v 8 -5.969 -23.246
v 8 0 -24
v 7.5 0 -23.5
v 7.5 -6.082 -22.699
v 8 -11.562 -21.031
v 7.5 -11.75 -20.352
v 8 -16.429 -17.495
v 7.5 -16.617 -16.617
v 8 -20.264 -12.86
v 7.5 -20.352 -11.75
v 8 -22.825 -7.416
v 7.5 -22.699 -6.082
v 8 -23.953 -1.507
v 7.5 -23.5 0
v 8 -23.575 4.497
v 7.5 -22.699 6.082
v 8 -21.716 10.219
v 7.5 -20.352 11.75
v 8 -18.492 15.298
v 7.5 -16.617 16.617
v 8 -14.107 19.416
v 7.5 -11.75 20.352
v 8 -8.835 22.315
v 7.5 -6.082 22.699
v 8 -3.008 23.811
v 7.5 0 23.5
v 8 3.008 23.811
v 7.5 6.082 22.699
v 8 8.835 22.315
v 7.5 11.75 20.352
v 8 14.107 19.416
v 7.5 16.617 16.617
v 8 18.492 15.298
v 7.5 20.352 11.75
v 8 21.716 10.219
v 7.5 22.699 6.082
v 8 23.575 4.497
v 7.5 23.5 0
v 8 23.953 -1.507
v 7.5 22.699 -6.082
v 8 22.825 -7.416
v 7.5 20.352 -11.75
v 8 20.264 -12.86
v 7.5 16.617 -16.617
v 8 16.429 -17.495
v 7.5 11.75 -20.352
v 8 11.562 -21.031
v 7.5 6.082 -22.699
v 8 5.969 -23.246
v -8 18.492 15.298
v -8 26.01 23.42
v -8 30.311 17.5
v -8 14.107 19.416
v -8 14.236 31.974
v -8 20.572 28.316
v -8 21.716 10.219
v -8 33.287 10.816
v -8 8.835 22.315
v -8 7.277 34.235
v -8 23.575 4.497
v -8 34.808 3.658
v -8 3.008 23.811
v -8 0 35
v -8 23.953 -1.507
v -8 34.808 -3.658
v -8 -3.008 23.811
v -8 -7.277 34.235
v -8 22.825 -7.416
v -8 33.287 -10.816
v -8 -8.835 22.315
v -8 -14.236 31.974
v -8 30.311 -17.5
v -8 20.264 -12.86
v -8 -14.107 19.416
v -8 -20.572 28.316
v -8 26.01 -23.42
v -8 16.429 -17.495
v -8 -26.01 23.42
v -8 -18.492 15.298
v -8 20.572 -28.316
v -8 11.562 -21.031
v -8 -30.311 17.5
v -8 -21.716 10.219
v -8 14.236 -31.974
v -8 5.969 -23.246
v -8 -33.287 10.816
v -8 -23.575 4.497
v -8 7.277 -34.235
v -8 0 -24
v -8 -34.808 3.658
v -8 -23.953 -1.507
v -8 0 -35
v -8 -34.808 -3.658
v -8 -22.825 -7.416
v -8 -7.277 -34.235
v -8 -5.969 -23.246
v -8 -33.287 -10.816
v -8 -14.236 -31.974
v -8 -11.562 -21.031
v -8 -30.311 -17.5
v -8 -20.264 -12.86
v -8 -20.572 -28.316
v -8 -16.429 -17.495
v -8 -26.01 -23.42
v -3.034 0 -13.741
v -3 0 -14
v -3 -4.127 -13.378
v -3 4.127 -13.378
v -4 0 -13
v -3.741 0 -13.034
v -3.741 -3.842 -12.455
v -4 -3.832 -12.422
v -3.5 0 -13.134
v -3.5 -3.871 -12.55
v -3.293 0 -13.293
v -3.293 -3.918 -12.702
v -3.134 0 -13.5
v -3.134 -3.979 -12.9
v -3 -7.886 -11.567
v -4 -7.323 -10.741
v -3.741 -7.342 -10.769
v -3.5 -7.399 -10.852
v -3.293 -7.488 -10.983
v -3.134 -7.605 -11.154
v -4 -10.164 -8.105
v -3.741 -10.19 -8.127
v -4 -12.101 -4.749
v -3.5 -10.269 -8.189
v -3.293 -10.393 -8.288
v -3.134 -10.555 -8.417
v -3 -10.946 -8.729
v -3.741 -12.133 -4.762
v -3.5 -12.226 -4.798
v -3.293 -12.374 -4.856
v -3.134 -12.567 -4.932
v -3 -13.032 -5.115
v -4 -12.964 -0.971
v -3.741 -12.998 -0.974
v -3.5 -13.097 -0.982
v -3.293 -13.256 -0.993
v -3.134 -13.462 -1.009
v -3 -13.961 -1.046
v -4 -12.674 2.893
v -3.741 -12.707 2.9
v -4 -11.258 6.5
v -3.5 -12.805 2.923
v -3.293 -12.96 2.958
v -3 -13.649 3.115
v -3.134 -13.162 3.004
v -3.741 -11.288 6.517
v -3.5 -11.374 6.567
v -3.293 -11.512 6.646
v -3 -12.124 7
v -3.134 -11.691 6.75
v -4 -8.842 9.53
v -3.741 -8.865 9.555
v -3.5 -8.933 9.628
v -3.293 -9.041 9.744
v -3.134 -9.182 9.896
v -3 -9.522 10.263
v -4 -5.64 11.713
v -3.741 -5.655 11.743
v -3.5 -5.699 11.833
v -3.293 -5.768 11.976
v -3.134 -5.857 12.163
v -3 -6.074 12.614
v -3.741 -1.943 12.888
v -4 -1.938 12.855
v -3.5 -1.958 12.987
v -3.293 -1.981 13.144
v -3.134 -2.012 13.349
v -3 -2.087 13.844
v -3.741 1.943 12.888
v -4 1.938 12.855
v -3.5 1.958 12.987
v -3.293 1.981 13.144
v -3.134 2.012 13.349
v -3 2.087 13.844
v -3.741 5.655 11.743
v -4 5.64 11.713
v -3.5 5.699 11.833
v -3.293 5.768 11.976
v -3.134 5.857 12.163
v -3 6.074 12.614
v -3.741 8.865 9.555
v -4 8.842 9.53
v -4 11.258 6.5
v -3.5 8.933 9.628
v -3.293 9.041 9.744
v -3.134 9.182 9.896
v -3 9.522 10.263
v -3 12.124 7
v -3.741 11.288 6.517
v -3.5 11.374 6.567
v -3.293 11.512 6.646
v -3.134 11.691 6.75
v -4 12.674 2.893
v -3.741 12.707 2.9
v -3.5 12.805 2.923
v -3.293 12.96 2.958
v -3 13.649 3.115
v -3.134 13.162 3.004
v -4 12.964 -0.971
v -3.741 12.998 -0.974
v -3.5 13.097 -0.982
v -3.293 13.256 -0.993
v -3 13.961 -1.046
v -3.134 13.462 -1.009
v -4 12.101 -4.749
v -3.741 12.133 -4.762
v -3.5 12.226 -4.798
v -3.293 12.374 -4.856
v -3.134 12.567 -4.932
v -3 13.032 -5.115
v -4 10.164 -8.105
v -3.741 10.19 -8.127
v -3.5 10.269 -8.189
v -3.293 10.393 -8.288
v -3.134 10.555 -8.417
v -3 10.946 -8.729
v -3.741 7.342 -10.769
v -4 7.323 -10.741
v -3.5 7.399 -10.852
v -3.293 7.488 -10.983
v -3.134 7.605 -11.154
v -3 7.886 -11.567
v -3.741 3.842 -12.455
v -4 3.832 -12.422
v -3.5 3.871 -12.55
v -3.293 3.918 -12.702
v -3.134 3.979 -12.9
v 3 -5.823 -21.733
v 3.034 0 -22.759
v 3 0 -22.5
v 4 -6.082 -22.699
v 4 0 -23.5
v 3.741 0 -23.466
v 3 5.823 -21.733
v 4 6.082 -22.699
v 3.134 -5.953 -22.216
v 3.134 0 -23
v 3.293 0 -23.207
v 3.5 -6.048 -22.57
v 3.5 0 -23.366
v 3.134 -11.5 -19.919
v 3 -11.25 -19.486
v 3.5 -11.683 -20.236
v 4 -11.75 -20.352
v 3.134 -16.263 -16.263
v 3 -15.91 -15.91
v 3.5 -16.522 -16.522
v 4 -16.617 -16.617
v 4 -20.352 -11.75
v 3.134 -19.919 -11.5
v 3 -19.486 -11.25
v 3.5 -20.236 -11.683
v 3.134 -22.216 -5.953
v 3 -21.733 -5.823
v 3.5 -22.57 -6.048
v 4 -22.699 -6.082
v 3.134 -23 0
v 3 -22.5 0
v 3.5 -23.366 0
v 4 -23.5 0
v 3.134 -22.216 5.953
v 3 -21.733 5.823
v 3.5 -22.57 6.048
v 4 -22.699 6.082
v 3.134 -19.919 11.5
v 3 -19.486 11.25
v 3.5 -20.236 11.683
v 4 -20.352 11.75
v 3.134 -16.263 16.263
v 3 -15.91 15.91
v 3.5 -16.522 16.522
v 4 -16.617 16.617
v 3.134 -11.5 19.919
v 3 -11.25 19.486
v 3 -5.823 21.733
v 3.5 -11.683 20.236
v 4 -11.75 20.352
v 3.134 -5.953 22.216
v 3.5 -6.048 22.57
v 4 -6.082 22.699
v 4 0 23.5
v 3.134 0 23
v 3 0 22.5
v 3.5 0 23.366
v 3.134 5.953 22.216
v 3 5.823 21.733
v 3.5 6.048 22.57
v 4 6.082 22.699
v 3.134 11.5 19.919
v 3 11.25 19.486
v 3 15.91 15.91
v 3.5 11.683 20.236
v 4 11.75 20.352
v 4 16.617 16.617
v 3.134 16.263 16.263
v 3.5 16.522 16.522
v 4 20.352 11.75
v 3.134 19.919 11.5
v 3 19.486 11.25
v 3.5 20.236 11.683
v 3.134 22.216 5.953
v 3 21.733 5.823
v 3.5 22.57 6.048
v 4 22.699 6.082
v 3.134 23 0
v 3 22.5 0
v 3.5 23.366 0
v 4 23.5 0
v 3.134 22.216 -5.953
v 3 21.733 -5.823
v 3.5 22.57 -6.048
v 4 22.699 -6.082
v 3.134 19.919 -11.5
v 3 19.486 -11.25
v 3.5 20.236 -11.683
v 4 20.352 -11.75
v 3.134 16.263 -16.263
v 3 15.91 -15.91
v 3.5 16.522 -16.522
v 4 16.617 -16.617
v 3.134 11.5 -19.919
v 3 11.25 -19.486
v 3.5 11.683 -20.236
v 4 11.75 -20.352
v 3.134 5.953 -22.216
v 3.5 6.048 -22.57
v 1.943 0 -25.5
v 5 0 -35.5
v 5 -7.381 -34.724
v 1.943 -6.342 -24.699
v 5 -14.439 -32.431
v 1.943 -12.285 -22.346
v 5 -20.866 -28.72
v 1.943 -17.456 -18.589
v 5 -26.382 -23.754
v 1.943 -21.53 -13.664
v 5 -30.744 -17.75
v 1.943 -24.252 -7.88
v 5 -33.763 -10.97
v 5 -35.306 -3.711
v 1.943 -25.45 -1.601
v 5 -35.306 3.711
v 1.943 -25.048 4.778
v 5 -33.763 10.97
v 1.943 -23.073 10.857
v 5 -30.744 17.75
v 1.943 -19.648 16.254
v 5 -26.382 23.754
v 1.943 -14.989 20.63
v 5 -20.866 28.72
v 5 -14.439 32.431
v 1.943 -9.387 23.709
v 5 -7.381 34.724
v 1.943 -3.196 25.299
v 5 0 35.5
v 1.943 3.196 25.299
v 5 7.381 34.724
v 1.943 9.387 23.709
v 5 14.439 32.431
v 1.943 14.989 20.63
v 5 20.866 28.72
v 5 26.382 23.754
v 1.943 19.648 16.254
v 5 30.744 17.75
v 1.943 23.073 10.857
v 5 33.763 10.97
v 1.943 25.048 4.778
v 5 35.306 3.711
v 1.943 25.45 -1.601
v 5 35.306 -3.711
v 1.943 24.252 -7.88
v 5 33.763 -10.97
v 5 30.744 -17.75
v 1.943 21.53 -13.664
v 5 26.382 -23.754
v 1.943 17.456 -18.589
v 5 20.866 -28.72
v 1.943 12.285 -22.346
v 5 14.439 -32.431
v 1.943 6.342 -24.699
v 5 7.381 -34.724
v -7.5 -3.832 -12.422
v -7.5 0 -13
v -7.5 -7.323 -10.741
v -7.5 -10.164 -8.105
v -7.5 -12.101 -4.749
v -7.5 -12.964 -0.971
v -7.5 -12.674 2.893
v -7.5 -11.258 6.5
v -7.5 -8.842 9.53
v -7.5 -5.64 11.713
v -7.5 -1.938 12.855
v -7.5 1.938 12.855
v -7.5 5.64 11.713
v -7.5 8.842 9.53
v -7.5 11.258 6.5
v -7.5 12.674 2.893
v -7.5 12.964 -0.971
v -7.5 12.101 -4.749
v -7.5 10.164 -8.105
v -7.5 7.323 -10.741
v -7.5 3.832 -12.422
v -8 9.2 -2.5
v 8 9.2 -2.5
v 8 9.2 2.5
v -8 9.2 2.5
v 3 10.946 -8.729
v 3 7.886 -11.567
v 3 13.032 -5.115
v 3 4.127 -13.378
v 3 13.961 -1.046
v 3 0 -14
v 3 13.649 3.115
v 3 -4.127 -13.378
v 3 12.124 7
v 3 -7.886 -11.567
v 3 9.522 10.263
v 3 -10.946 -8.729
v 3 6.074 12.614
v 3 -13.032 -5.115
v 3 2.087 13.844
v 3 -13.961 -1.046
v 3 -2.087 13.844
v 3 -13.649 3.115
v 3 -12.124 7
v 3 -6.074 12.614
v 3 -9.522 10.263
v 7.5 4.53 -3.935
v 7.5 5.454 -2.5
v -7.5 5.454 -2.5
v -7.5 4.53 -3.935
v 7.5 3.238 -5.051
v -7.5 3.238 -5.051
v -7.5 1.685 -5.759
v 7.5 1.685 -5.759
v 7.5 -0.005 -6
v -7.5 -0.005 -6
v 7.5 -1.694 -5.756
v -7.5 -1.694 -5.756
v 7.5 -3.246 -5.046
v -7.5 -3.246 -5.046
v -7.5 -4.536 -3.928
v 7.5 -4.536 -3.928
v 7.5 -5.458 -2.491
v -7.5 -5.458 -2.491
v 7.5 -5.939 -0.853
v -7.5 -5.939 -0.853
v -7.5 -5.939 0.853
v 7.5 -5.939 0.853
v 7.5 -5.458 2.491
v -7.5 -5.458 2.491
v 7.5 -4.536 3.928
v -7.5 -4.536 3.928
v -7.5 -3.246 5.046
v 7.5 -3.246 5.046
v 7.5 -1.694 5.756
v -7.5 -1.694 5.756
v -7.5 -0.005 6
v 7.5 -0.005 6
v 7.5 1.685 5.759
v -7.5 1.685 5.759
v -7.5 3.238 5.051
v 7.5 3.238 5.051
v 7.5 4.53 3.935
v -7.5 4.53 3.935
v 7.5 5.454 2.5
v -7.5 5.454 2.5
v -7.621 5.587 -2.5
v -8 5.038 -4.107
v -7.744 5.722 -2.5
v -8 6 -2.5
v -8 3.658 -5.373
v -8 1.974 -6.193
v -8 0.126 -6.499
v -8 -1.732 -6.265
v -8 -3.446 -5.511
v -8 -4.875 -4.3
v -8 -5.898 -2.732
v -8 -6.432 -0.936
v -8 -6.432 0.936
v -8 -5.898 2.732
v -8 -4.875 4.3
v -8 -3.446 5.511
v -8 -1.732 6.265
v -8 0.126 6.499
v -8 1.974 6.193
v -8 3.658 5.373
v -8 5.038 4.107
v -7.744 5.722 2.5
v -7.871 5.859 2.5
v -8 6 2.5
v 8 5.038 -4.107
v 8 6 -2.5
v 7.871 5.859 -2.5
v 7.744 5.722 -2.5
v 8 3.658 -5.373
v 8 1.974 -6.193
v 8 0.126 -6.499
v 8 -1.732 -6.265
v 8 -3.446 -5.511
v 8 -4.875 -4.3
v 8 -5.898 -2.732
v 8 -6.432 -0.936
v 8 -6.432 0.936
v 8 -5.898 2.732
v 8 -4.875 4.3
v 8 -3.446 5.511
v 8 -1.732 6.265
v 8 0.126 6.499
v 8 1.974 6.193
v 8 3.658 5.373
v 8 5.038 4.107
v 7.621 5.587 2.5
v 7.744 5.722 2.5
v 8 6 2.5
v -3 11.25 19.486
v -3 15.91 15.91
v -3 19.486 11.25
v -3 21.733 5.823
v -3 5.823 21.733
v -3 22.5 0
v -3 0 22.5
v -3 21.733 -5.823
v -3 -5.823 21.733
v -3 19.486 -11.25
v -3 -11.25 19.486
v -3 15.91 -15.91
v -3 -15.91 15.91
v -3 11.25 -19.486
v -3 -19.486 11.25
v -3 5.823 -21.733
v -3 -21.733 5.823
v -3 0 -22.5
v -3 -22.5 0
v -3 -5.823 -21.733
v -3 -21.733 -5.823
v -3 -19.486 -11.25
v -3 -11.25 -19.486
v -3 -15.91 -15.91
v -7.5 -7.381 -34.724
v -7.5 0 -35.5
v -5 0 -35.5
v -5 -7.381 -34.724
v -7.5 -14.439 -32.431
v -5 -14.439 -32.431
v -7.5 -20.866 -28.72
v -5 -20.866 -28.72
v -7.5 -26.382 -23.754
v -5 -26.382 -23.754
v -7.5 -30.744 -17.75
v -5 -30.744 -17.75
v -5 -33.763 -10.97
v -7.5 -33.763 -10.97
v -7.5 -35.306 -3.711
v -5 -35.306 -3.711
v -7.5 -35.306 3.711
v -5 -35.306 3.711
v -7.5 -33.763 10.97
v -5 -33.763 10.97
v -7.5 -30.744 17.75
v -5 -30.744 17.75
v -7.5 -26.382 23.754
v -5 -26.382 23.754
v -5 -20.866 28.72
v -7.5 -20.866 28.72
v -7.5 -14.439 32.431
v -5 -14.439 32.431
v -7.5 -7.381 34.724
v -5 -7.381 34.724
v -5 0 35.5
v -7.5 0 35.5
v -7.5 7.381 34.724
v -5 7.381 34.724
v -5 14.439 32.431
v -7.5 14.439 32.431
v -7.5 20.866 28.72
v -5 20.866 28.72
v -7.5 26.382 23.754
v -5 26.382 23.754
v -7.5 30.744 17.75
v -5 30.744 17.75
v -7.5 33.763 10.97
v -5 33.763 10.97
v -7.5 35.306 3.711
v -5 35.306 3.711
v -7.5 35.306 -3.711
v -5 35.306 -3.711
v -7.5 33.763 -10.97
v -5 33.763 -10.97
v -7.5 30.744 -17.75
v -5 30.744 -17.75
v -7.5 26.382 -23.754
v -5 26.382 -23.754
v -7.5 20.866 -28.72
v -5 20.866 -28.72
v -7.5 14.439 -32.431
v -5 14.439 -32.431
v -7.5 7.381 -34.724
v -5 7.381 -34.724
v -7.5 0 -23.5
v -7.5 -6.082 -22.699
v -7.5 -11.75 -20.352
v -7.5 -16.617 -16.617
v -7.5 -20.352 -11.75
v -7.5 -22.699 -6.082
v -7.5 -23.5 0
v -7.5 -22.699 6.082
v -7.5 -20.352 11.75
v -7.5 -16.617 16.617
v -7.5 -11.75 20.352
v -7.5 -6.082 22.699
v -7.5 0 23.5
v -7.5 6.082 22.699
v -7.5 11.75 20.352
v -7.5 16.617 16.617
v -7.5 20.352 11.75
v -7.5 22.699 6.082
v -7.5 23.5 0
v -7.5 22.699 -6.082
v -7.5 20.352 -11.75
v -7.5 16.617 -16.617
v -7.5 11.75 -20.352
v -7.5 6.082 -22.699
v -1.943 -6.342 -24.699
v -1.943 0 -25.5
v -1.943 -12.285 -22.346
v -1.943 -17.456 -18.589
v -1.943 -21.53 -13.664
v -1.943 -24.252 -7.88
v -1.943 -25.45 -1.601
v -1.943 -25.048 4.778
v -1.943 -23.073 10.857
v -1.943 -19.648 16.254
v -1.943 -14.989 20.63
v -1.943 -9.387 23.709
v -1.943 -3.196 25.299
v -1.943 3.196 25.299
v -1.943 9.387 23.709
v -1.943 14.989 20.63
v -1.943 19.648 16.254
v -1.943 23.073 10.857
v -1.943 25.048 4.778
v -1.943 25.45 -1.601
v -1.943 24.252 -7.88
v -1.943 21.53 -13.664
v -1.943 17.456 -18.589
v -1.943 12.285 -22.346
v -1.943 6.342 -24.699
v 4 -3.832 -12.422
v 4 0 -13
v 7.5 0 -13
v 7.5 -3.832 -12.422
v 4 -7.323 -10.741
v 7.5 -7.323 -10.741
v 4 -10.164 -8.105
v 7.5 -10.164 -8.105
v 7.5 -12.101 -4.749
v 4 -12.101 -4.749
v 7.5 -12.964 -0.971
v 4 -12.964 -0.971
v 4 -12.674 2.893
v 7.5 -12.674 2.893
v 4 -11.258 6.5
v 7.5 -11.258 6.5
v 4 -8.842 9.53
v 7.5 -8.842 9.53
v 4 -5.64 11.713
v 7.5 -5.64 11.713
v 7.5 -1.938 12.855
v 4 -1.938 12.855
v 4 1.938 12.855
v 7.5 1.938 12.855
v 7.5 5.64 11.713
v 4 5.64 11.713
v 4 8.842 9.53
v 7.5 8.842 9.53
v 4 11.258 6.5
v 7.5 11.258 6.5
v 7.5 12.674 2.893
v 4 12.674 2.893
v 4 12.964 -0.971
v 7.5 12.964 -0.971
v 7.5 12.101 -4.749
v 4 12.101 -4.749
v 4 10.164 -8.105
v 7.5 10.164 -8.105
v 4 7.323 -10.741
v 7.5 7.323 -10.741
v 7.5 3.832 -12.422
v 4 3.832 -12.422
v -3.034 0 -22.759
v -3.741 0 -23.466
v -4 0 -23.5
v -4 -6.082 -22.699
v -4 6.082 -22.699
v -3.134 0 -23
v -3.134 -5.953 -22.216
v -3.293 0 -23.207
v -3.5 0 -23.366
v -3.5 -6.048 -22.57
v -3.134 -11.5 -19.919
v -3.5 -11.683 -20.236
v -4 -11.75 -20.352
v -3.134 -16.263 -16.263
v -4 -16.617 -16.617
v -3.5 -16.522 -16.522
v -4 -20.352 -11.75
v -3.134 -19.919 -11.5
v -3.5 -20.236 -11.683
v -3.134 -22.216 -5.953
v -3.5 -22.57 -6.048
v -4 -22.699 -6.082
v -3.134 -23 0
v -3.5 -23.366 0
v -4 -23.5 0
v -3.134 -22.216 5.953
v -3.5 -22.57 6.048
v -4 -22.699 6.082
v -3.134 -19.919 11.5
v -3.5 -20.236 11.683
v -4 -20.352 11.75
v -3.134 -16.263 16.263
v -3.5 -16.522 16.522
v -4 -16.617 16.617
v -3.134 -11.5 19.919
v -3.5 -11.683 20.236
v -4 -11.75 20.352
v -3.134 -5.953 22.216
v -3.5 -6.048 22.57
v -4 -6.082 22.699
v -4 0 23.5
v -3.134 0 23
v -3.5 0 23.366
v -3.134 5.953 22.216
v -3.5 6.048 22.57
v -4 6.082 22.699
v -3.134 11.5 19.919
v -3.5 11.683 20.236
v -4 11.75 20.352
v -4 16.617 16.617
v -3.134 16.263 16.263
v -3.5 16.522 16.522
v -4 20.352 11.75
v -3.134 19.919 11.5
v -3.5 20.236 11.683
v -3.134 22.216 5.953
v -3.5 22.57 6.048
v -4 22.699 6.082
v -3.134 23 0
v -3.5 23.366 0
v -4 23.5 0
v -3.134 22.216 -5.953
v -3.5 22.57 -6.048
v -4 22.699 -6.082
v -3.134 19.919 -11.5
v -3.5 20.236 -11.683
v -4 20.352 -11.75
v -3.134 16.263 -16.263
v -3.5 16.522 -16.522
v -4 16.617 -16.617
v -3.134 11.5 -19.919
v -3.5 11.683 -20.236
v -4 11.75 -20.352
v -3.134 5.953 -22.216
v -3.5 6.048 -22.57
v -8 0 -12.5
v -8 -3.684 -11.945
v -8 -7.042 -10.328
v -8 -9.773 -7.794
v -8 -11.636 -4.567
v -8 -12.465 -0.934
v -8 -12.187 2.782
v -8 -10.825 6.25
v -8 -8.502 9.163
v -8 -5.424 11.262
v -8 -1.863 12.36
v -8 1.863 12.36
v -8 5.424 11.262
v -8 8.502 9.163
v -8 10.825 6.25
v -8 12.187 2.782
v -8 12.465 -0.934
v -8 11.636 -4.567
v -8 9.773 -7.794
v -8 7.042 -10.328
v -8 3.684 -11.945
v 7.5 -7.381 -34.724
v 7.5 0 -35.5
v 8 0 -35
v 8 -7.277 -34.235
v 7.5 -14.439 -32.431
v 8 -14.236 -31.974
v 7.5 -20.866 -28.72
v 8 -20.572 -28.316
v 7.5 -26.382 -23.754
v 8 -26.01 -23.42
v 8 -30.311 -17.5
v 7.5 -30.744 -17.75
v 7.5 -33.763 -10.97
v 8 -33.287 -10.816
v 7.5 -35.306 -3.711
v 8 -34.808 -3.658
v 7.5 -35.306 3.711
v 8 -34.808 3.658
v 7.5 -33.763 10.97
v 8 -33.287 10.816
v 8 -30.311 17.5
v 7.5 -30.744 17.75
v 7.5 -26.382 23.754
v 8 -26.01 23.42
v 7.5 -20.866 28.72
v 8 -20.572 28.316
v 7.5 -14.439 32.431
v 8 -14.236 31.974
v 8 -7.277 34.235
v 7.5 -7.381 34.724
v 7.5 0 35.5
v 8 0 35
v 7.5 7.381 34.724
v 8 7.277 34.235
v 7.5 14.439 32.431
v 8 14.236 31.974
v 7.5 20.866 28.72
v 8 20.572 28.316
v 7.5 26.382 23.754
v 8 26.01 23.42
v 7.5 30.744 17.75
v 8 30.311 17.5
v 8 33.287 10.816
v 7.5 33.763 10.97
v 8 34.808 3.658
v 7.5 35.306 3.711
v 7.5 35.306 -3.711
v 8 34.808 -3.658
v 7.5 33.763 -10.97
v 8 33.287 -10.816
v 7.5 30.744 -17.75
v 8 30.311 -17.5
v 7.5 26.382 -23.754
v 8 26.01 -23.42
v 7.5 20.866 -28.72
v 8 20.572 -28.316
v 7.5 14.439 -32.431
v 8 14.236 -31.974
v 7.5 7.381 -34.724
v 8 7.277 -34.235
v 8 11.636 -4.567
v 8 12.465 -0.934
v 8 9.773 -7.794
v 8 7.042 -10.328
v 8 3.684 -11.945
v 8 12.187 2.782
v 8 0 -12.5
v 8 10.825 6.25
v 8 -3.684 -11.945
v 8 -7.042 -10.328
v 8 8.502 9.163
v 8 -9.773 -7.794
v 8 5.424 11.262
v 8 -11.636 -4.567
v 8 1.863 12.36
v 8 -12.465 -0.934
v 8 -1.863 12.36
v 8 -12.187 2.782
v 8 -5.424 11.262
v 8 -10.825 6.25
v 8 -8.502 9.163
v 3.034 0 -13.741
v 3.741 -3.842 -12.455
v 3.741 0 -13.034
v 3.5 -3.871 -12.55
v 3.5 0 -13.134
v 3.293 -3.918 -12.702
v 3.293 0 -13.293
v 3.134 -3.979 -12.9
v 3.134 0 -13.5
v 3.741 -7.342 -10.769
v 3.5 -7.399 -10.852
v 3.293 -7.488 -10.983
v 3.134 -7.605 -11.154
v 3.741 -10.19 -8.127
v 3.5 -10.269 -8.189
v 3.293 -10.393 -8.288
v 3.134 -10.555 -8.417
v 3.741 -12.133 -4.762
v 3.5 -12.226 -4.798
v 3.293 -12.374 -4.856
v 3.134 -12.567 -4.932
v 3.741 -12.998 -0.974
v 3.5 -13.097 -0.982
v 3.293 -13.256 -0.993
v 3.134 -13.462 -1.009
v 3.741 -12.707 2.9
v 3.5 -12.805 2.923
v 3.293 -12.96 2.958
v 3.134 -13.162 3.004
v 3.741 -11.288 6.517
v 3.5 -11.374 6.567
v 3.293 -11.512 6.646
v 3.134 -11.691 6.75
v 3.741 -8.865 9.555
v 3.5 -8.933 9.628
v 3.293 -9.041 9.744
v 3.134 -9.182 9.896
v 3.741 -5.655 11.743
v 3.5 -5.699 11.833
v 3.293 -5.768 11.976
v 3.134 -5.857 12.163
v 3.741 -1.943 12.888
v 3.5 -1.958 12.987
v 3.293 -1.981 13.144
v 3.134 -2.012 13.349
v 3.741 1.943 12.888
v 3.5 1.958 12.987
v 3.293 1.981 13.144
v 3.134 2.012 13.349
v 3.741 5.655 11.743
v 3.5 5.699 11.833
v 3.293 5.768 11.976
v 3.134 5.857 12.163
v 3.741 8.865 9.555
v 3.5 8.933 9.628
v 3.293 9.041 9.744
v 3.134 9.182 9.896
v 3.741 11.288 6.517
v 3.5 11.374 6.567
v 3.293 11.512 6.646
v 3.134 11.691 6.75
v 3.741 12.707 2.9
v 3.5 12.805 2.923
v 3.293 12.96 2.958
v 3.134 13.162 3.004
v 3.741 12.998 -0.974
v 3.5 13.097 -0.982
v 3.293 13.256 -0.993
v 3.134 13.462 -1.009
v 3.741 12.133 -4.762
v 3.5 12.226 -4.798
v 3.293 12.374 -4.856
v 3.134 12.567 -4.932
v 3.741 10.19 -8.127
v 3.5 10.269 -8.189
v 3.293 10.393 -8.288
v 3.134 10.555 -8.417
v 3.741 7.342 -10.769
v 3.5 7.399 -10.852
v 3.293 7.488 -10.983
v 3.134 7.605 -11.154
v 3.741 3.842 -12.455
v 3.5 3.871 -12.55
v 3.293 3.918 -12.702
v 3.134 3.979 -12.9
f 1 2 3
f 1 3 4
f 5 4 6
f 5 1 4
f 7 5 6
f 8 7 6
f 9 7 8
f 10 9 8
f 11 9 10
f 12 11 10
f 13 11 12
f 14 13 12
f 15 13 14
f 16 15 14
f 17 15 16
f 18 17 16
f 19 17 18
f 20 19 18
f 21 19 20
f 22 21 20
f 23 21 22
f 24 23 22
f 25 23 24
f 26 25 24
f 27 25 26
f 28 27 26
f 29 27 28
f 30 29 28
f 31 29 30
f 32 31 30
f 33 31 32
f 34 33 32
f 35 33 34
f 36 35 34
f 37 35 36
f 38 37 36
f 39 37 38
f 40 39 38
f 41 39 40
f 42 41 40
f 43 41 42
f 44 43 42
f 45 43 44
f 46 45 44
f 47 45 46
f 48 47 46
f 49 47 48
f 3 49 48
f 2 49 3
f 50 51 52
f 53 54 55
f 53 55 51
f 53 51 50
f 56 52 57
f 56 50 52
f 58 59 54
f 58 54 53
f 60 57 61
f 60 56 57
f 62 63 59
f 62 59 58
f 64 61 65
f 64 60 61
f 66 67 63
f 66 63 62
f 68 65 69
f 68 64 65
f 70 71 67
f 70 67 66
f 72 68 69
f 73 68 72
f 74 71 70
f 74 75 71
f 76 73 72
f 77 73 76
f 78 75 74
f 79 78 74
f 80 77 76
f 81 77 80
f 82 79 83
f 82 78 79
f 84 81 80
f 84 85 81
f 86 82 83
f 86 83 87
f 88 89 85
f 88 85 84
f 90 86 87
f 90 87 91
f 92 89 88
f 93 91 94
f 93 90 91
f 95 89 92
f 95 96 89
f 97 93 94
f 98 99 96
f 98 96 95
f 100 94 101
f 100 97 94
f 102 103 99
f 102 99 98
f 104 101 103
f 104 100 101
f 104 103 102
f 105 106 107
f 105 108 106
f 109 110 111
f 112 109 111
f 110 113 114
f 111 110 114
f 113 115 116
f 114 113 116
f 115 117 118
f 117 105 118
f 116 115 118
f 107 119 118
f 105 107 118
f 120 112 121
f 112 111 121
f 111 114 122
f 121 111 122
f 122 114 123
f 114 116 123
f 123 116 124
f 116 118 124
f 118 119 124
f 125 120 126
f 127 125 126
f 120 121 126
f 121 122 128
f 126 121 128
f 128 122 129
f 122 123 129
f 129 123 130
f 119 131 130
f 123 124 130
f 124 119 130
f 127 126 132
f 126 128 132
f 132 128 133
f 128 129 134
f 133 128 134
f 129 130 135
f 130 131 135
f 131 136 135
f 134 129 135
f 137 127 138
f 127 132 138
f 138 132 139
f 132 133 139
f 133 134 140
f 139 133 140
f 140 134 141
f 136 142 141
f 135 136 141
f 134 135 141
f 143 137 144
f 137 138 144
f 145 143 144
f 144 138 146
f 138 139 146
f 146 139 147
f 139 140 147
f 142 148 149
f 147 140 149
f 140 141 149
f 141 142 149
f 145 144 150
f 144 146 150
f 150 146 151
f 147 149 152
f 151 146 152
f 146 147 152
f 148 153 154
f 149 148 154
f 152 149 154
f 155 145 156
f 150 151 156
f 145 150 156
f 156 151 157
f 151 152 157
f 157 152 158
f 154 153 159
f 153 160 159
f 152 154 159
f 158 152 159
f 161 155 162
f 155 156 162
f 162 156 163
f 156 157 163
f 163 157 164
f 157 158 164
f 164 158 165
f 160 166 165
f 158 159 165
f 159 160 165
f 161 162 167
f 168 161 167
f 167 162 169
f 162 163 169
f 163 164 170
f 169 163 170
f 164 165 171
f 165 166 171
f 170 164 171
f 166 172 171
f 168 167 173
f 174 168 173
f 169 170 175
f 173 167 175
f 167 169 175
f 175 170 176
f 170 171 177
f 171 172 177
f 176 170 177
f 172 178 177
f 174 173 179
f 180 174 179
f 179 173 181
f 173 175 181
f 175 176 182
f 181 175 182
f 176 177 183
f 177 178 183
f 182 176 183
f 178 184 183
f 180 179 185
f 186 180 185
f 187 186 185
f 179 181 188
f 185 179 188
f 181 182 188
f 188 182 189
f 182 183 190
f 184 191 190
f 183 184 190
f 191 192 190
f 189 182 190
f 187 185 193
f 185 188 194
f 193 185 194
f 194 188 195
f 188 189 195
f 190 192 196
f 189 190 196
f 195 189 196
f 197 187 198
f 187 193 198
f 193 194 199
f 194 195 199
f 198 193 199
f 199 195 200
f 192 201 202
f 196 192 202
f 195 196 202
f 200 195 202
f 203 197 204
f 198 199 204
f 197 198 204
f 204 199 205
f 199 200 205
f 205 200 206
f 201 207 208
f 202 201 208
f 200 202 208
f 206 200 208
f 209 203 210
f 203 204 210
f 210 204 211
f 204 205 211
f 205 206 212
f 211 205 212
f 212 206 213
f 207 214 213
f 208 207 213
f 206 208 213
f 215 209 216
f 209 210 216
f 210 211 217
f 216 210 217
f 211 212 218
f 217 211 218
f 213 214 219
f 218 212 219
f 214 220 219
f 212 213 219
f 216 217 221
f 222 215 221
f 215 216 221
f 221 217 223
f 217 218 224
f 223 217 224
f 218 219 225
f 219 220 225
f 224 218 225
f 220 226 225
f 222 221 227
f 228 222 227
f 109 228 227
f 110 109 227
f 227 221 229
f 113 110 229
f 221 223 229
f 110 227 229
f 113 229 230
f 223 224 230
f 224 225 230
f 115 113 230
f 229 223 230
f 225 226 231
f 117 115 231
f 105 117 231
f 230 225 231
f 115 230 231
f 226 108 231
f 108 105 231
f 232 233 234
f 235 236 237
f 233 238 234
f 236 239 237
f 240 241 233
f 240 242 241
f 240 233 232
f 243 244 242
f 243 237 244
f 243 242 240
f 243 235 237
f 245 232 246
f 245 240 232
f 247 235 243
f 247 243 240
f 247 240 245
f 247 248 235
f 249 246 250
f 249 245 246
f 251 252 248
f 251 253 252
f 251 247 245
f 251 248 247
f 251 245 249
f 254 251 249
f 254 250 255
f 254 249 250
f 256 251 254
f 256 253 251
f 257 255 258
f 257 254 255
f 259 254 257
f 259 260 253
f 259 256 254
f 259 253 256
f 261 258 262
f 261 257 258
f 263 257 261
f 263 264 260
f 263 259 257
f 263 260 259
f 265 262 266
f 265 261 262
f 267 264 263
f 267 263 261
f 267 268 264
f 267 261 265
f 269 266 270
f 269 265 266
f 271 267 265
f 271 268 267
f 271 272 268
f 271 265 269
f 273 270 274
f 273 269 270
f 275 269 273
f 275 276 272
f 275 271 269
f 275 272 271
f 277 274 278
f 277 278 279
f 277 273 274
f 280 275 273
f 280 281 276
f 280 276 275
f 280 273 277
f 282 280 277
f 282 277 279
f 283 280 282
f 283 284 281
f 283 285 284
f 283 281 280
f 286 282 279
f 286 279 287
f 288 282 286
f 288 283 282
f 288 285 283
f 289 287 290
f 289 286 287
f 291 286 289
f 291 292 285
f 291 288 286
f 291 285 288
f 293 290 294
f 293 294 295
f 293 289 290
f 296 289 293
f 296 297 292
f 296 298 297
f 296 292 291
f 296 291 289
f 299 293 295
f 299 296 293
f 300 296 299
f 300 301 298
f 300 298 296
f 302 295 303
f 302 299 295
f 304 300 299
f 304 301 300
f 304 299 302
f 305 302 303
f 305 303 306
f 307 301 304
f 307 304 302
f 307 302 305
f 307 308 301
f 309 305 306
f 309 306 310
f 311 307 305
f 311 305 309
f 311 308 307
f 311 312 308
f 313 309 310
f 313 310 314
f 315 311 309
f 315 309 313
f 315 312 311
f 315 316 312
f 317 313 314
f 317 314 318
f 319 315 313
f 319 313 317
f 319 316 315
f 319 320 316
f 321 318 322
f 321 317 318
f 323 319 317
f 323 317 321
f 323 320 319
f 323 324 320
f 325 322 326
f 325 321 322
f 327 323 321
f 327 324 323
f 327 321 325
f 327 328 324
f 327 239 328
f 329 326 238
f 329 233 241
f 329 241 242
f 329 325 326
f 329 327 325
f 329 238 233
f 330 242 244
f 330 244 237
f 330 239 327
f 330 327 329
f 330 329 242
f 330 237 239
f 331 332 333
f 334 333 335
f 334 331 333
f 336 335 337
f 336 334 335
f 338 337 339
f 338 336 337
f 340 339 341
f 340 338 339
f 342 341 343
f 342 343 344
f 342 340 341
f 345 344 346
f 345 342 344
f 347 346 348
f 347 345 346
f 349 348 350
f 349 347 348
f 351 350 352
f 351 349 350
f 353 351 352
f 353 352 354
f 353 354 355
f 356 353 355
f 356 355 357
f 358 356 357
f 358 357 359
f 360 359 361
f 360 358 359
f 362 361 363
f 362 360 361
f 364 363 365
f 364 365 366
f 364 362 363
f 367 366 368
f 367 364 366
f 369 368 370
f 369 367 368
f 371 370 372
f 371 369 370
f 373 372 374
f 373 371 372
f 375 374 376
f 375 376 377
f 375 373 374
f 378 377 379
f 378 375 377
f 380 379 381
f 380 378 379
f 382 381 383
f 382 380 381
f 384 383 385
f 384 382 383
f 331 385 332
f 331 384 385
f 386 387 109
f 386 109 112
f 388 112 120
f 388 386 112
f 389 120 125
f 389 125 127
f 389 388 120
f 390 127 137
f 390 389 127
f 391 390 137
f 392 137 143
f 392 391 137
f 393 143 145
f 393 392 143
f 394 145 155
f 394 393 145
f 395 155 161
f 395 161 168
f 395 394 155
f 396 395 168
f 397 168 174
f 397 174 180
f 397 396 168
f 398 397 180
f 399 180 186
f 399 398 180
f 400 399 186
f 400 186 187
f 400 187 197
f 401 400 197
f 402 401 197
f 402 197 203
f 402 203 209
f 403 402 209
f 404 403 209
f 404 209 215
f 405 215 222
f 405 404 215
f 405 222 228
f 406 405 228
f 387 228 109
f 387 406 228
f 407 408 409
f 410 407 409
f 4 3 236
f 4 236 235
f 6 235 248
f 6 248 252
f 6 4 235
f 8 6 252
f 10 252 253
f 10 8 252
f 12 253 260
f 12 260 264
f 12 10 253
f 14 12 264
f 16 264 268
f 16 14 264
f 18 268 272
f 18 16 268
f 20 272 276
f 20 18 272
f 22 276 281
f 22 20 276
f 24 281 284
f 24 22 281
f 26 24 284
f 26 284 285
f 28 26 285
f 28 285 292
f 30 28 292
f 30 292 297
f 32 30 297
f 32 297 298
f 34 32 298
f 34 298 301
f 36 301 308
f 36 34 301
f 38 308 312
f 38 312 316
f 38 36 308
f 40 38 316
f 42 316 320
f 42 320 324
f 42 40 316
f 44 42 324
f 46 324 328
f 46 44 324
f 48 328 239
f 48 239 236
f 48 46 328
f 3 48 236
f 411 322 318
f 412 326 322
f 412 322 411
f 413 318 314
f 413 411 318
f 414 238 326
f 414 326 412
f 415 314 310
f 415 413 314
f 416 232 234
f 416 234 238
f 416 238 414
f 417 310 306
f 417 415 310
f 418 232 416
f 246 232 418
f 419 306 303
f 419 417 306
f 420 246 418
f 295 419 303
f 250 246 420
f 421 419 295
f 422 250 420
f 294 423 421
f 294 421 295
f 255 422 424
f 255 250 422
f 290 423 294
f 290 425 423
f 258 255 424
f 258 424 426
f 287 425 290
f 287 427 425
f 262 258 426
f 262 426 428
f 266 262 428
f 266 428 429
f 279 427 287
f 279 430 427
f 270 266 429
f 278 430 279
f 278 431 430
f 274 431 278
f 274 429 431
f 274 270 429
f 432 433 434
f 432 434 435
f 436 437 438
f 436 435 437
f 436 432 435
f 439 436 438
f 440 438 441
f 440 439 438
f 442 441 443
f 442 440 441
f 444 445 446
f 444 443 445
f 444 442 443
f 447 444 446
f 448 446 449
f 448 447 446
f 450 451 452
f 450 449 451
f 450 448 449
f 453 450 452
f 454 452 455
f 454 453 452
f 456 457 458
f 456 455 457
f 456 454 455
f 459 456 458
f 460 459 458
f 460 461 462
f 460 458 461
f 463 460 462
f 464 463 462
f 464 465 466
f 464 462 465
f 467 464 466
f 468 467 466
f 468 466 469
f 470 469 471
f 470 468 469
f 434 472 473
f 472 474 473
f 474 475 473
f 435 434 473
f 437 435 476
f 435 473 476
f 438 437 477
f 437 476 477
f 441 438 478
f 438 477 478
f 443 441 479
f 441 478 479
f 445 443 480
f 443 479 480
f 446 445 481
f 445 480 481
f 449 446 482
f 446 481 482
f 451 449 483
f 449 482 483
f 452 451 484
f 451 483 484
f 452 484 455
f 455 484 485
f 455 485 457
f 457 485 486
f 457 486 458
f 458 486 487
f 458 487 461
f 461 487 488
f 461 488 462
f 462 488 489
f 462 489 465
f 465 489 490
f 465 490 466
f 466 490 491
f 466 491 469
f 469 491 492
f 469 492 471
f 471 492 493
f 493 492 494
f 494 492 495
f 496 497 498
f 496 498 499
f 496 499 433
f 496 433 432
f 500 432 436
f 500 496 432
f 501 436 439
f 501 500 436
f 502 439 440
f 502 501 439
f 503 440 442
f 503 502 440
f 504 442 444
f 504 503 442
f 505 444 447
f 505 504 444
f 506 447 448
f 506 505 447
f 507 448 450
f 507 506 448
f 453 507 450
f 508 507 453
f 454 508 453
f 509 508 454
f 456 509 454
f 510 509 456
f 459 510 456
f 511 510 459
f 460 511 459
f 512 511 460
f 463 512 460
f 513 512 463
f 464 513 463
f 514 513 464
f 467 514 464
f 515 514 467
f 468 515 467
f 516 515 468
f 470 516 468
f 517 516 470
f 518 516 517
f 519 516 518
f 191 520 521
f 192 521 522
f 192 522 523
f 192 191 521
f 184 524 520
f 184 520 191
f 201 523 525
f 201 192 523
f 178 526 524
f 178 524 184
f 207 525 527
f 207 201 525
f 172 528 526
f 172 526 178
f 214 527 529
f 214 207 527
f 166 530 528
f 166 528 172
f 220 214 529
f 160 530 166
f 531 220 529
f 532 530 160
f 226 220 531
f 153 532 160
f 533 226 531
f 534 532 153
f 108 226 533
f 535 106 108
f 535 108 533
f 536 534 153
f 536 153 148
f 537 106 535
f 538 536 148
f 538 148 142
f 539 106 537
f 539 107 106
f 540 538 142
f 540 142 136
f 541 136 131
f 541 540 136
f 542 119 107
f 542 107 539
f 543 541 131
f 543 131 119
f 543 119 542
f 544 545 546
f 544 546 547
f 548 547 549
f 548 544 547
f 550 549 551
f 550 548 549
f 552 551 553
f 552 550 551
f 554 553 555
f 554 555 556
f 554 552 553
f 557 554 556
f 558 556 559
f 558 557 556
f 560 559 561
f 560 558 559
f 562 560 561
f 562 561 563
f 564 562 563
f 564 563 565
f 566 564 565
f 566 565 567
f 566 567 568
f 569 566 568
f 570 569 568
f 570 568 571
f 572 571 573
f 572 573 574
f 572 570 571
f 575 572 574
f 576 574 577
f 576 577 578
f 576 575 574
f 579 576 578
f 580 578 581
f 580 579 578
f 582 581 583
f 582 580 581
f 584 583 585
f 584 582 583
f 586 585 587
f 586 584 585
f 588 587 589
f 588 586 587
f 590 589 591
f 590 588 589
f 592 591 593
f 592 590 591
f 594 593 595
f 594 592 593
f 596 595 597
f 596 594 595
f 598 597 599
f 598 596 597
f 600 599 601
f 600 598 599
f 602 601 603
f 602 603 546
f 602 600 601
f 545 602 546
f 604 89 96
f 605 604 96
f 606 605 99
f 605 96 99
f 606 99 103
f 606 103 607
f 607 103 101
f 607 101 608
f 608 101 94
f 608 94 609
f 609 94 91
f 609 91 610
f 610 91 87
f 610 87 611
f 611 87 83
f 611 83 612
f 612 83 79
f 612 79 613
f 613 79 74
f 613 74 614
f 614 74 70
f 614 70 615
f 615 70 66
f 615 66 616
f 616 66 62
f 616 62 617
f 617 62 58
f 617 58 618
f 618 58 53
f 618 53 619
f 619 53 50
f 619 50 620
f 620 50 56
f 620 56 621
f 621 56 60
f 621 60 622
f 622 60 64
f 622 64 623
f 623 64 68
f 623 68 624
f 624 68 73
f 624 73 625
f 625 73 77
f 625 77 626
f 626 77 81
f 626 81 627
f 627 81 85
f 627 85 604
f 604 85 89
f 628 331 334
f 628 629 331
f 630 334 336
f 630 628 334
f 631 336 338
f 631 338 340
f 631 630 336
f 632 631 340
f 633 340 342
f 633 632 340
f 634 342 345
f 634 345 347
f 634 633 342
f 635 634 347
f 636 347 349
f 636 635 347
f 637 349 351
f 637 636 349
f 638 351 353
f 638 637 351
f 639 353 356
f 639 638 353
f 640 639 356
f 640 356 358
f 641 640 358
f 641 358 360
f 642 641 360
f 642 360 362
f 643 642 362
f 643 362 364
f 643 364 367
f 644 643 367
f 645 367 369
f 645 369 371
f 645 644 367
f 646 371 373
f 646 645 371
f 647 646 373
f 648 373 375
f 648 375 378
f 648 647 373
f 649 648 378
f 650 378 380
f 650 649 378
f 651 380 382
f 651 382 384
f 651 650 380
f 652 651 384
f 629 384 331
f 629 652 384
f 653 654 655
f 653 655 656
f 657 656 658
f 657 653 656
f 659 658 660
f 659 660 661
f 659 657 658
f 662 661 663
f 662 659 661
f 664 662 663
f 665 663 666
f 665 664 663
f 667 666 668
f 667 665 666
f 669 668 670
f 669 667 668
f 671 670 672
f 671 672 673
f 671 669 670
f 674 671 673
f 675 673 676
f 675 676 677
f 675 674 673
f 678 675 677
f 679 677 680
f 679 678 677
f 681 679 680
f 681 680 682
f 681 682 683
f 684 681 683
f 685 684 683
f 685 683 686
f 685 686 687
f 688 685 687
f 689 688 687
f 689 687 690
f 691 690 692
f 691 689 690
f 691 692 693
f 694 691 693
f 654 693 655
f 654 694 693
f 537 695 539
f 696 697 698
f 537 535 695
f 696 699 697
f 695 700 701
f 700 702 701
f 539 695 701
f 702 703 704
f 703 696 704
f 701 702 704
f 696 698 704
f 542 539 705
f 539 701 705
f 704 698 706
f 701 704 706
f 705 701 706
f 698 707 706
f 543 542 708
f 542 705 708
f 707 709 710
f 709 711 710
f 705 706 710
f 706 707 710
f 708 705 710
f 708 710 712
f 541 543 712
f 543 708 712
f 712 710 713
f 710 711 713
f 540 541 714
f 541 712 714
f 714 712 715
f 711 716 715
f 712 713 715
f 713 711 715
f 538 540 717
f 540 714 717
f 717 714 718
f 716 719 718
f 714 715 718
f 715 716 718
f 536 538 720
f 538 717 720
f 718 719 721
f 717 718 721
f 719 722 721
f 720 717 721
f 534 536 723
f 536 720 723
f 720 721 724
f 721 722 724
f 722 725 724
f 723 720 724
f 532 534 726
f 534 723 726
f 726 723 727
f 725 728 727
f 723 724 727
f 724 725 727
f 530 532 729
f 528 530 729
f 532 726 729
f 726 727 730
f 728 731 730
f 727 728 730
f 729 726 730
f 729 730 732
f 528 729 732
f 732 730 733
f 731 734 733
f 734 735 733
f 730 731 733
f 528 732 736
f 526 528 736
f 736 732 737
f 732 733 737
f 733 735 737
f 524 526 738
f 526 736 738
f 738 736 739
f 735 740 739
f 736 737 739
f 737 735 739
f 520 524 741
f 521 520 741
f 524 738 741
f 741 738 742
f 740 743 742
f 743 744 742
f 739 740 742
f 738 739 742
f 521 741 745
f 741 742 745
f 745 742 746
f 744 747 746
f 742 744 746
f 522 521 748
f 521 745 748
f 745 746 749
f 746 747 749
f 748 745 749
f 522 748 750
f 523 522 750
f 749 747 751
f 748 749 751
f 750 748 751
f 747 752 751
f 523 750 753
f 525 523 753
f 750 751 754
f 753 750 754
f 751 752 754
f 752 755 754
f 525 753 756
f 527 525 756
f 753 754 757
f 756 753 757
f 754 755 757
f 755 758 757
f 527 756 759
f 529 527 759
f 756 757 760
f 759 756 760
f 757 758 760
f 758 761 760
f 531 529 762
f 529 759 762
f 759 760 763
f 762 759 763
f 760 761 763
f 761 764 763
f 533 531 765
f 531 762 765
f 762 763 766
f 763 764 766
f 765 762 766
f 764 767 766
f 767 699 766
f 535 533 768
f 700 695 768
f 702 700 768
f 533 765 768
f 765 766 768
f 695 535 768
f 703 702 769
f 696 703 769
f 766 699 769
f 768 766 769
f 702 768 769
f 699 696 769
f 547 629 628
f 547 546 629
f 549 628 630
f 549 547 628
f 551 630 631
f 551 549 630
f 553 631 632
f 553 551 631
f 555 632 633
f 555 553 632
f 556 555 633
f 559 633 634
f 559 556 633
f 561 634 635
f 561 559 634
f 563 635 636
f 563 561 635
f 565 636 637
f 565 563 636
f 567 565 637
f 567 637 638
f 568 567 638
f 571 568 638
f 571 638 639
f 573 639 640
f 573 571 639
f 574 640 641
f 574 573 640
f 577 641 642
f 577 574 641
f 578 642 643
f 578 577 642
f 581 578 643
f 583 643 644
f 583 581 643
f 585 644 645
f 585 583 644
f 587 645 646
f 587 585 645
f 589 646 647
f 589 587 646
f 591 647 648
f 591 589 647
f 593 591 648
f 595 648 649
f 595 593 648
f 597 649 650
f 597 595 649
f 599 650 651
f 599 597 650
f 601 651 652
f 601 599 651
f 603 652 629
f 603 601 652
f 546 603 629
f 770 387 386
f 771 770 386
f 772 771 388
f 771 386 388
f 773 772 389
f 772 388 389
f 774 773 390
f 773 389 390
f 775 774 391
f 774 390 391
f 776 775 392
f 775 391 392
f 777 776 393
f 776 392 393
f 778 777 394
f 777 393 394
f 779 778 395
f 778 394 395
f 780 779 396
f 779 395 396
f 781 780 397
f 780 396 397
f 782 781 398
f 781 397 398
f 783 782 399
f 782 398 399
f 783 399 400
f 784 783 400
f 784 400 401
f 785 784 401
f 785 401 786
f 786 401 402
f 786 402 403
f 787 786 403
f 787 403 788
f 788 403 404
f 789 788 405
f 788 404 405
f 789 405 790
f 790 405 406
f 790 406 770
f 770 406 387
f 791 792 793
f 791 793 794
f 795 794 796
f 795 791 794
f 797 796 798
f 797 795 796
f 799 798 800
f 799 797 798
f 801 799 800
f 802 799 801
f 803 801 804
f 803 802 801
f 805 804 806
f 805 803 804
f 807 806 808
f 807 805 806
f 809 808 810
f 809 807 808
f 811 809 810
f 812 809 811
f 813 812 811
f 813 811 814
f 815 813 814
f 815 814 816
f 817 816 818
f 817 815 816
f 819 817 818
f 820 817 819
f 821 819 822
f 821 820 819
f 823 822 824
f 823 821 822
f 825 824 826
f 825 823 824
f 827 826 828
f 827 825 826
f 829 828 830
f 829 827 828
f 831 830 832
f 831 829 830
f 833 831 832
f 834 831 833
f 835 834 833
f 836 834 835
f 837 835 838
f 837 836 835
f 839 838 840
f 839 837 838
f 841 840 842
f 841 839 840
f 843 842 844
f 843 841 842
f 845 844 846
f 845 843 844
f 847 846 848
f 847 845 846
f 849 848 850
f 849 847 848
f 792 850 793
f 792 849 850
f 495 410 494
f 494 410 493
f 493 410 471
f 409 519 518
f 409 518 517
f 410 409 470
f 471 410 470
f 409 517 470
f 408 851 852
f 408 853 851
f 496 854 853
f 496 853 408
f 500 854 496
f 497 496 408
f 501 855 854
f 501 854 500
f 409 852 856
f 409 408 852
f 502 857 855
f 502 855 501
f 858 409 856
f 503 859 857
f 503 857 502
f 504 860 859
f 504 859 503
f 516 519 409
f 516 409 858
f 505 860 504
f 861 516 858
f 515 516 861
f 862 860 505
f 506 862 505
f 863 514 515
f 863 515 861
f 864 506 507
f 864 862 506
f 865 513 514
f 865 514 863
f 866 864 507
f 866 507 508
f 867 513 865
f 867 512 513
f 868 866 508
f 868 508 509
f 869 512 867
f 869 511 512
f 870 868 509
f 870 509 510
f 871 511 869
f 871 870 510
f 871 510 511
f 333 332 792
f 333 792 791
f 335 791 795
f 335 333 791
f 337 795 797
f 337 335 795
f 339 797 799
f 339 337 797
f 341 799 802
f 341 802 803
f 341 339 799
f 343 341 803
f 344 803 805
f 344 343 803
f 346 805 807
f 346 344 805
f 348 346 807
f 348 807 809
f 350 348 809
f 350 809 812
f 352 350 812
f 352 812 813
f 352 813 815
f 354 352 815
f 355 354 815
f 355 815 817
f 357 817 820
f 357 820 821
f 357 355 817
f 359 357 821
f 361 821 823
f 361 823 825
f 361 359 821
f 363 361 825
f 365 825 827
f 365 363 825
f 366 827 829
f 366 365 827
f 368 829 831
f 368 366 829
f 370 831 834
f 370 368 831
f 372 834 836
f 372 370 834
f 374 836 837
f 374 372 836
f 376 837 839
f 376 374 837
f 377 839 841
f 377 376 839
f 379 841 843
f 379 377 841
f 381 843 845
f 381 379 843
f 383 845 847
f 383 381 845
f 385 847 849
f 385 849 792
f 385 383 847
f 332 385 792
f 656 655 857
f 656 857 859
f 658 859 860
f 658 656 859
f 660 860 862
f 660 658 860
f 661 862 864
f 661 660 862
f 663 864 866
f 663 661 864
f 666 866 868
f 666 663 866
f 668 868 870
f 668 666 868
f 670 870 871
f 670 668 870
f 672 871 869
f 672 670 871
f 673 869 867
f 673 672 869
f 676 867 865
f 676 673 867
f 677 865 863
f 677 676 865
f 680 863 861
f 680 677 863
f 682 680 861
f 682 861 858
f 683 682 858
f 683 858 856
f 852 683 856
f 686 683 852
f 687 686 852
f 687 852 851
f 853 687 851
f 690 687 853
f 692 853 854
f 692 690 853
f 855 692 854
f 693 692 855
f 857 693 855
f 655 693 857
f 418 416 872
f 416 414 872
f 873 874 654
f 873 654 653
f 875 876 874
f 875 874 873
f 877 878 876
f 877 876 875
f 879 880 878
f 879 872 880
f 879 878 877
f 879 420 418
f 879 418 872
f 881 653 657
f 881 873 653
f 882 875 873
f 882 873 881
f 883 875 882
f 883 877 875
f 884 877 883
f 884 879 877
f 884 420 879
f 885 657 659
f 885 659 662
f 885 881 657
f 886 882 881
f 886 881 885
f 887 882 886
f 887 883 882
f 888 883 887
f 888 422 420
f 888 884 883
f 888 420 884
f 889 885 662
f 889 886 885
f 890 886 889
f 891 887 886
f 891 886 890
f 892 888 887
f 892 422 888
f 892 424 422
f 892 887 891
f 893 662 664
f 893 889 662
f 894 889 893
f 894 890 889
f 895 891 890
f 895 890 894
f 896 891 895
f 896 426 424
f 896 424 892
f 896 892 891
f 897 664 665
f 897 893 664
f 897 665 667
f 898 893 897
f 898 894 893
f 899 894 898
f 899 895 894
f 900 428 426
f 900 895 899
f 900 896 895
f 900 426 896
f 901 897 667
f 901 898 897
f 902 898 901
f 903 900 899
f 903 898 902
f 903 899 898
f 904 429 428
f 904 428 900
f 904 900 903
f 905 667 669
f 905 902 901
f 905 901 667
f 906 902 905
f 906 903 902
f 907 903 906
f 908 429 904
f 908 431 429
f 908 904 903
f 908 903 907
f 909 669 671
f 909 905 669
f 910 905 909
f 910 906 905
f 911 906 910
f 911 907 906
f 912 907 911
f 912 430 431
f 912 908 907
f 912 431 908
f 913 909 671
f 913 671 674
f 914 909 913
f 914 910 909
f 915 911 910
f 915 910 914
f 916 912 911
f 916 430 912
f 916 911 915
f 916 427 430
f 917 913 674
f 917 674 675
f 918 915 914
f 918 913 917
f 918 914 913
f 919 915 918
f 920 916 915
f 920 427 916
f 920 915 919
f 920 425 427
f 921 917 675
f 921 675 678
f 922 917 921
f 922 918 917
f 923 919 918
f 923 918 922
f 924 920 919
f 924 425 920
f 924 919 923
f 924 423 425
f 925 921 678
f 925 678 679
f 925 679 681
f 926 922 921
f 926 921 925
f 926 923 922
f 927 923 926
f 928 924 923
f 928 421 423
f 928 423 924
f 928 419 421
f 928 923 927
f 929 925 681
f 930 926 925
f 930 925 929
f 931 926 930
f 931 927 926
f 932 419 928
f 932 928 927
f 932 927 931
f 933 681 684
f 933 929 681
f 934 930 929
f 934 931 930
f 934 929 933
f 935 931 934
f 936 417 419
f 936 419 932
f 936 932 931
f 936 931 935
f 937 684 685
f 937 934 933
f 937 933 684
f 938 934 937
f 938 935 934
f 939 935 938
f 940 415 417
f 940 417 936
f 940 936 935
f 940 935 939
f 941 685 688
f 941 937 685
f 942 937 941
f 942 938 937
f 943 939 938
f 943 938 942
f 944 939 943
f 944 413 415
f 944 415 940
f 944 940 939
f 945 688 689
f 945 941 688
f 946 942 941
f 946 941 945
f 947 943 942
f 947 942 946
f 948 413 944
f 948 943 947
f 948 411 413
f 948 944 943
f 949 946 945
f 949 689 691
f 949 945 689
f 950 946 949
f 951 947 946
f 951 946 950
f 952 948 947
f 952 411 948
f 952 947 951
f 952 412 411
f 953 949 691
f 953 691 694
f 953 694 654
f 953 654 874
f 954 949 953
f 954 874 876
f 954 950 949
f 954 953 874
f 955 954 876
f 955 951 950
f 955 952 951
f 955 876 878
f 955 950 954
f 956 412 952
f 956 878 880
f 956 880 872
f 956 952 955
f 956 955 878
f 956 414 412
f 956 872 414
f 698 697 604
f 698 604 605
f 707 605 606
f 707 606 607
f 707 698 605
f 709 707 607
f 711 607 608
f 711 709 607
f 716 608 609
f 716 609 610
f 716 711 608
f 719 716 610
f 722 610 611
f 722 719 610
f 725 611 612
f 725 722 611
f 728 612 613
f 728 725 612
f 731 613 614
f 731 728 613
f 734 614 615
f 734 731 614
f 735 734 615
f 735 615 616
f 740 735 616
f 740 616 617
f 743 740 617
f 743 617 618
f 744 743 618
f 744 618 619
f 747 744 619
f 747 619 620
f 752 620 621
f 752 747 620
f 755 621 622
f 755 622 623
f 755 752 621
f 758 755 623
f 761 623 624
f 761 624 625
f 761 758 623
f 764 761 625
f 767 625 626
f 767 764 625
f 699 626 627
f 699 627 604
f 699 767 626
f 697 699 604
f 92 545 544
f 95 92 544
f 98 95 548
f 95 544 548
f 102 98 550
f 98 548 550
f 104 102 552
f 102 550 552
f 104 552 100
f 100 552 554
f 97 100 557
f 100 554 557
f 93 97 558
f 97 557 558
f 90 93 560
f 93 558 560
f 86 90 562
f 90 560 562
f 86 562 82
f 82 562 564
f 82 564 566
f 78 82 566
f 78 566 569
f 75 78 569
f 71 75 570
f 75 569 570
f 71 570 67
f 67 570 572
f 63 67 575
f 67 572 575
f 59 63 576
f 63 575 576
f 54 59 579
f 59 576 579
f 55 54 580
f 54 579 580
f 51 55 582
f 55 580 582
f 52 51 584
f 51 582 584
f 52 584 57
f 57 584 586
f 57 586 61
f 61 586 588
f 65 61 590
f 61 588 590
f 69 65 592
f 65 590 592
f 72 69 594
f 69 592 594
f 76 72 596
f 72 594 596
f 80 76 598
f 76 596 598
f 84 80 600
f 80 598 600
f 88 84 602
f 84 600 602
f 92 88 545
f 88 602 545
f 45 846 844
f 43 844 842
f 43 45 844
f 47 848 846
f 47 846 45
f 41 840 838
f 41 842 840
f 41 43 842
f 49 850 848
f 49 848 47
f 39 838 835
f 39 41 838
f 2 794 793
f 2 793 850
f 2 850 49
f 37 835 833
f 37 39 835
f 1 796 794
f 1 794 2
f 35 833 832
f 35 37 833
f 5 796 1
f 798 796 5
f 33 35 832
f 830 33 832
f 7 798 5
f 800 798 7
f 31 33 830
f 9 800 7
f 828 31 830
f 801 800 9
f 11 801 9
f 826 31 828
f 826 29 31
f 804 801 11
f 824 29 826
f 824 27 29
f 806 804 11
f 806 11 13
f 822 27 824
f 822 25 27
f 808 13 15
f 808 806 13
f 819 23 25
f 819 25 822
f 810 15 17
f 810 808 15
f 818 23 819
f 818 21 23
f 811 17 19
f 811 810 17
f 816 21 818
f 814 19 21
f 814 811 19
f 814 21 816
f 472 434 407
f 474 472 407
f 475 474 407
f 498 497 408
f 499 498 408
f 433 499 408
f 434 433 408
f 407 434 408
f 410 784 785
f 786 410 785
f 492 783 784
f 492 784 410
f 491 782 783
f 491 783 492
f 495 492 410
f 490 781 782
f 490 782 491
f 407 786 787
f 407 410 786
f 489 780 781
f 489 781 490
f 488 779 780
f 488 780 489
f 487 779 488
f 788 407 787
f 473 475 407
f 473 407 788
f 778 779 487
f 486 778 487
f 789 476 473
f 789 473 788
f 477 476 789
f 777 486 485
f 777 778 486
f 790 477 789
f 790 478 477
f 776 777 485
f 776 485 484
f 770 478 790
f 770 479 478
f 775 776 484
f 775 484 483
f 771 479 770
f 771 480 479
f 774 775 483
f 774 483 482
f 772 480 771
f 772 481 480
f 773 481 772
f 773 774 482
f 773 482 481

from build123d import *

# Parameters (mm, degrees)
CHAMFER1_SIZE      = 0.5
CHAMFER2_SIZE      = 0.5
FILLET2_R          = 1
CUT_EXTRUDE1_DEPTH = 53.692504211
FILLET3_R          = 1
CHAMFER3_SIZE      = 0.5


with BuildPart() as part:
    # Sketch1 → Revolve1 (revolve)
    with BuildSketch(Plane(origin=(0, 0, 0), x_dir=(1, 0, 0), z_dir=(0, 1, 0))):
        Polygon((-8, 35.5), (-8, 23.5), (-3, 23.5), (-3, 13), (-8, 13), (-8, 6), (8, 6), (8, 13), (3, 13), (3, 23.5), (8, 23.5), (8, 35.5), (5, 35.5), (1.942693185, 25.5), (-1.942693185, 25.5), (-5, 35.5), align=None)
    revolve(axis=Axis((0, 0, 0), (-1, 0, 0)))

    # Chamfer1
    chamfer1_edges = [part.edges().sort_by_distance(p)[0] for p in [
        (8, 0, 6),
        (8, 0, 13),
        (8, 0, 35.5),
    ]]
    chamfer(chamfer1_edges, length=CHAMFER1_SIZE)

    # Chamfer2
    chamfer2_edges = [part.edges().sort_by_distance(p)[0] for p in [
        (-8, 0, 35.5),
        (-8, 0, 23.5),
        (-8, 0, 13),
        (-8, 0, 6),
    ]]
    chamfer(chamfer2_edges, length=CHAMFER2_SIZE)

    # Fillet2
    fillet2_edges = [part.edges().sort_by_distance(p)[0] for p in [
        (-3, 0, 23.5),
        (-3, 0, 13),
    ]]
    fillet(fillet2_edges, radius=FILLET2_R)

    # Sketch2 → Cut-Extrude1 (cut, through all)
    with BuildSketch(Plane(origin=(8, 0, 0), x_dir=(0, 0, -1), z_dir=(1, 0, 0))):
        Polygon((-2.5, 9.2), (-2.5, 4.689453437), (2.5, 4.689453437), (2.5, 6), (2.5, 9.2), align=None)
    extrude(amount=-CUT_EXTRUDE1_DEPTH, mode=Mode.SUBTRACT)

    # Fillet3
    fillet3_edges = [part.edges().sort_by_distance(p)[0] for p in [
        (3, 0, 13),
        (3, 0, 23.5),
    ]]
    fillet(fillet3_edges, radius=FILLET3_R)

    # Chamfer3
    chamfer3_edges = [part.edges().sort_by_distance(p)[0] for p in [
        (8, 0, 23.5),
    ]]
    chamfer(chamfer3_edges, length=CHAMFER3_SIZE)


solid = part.part
